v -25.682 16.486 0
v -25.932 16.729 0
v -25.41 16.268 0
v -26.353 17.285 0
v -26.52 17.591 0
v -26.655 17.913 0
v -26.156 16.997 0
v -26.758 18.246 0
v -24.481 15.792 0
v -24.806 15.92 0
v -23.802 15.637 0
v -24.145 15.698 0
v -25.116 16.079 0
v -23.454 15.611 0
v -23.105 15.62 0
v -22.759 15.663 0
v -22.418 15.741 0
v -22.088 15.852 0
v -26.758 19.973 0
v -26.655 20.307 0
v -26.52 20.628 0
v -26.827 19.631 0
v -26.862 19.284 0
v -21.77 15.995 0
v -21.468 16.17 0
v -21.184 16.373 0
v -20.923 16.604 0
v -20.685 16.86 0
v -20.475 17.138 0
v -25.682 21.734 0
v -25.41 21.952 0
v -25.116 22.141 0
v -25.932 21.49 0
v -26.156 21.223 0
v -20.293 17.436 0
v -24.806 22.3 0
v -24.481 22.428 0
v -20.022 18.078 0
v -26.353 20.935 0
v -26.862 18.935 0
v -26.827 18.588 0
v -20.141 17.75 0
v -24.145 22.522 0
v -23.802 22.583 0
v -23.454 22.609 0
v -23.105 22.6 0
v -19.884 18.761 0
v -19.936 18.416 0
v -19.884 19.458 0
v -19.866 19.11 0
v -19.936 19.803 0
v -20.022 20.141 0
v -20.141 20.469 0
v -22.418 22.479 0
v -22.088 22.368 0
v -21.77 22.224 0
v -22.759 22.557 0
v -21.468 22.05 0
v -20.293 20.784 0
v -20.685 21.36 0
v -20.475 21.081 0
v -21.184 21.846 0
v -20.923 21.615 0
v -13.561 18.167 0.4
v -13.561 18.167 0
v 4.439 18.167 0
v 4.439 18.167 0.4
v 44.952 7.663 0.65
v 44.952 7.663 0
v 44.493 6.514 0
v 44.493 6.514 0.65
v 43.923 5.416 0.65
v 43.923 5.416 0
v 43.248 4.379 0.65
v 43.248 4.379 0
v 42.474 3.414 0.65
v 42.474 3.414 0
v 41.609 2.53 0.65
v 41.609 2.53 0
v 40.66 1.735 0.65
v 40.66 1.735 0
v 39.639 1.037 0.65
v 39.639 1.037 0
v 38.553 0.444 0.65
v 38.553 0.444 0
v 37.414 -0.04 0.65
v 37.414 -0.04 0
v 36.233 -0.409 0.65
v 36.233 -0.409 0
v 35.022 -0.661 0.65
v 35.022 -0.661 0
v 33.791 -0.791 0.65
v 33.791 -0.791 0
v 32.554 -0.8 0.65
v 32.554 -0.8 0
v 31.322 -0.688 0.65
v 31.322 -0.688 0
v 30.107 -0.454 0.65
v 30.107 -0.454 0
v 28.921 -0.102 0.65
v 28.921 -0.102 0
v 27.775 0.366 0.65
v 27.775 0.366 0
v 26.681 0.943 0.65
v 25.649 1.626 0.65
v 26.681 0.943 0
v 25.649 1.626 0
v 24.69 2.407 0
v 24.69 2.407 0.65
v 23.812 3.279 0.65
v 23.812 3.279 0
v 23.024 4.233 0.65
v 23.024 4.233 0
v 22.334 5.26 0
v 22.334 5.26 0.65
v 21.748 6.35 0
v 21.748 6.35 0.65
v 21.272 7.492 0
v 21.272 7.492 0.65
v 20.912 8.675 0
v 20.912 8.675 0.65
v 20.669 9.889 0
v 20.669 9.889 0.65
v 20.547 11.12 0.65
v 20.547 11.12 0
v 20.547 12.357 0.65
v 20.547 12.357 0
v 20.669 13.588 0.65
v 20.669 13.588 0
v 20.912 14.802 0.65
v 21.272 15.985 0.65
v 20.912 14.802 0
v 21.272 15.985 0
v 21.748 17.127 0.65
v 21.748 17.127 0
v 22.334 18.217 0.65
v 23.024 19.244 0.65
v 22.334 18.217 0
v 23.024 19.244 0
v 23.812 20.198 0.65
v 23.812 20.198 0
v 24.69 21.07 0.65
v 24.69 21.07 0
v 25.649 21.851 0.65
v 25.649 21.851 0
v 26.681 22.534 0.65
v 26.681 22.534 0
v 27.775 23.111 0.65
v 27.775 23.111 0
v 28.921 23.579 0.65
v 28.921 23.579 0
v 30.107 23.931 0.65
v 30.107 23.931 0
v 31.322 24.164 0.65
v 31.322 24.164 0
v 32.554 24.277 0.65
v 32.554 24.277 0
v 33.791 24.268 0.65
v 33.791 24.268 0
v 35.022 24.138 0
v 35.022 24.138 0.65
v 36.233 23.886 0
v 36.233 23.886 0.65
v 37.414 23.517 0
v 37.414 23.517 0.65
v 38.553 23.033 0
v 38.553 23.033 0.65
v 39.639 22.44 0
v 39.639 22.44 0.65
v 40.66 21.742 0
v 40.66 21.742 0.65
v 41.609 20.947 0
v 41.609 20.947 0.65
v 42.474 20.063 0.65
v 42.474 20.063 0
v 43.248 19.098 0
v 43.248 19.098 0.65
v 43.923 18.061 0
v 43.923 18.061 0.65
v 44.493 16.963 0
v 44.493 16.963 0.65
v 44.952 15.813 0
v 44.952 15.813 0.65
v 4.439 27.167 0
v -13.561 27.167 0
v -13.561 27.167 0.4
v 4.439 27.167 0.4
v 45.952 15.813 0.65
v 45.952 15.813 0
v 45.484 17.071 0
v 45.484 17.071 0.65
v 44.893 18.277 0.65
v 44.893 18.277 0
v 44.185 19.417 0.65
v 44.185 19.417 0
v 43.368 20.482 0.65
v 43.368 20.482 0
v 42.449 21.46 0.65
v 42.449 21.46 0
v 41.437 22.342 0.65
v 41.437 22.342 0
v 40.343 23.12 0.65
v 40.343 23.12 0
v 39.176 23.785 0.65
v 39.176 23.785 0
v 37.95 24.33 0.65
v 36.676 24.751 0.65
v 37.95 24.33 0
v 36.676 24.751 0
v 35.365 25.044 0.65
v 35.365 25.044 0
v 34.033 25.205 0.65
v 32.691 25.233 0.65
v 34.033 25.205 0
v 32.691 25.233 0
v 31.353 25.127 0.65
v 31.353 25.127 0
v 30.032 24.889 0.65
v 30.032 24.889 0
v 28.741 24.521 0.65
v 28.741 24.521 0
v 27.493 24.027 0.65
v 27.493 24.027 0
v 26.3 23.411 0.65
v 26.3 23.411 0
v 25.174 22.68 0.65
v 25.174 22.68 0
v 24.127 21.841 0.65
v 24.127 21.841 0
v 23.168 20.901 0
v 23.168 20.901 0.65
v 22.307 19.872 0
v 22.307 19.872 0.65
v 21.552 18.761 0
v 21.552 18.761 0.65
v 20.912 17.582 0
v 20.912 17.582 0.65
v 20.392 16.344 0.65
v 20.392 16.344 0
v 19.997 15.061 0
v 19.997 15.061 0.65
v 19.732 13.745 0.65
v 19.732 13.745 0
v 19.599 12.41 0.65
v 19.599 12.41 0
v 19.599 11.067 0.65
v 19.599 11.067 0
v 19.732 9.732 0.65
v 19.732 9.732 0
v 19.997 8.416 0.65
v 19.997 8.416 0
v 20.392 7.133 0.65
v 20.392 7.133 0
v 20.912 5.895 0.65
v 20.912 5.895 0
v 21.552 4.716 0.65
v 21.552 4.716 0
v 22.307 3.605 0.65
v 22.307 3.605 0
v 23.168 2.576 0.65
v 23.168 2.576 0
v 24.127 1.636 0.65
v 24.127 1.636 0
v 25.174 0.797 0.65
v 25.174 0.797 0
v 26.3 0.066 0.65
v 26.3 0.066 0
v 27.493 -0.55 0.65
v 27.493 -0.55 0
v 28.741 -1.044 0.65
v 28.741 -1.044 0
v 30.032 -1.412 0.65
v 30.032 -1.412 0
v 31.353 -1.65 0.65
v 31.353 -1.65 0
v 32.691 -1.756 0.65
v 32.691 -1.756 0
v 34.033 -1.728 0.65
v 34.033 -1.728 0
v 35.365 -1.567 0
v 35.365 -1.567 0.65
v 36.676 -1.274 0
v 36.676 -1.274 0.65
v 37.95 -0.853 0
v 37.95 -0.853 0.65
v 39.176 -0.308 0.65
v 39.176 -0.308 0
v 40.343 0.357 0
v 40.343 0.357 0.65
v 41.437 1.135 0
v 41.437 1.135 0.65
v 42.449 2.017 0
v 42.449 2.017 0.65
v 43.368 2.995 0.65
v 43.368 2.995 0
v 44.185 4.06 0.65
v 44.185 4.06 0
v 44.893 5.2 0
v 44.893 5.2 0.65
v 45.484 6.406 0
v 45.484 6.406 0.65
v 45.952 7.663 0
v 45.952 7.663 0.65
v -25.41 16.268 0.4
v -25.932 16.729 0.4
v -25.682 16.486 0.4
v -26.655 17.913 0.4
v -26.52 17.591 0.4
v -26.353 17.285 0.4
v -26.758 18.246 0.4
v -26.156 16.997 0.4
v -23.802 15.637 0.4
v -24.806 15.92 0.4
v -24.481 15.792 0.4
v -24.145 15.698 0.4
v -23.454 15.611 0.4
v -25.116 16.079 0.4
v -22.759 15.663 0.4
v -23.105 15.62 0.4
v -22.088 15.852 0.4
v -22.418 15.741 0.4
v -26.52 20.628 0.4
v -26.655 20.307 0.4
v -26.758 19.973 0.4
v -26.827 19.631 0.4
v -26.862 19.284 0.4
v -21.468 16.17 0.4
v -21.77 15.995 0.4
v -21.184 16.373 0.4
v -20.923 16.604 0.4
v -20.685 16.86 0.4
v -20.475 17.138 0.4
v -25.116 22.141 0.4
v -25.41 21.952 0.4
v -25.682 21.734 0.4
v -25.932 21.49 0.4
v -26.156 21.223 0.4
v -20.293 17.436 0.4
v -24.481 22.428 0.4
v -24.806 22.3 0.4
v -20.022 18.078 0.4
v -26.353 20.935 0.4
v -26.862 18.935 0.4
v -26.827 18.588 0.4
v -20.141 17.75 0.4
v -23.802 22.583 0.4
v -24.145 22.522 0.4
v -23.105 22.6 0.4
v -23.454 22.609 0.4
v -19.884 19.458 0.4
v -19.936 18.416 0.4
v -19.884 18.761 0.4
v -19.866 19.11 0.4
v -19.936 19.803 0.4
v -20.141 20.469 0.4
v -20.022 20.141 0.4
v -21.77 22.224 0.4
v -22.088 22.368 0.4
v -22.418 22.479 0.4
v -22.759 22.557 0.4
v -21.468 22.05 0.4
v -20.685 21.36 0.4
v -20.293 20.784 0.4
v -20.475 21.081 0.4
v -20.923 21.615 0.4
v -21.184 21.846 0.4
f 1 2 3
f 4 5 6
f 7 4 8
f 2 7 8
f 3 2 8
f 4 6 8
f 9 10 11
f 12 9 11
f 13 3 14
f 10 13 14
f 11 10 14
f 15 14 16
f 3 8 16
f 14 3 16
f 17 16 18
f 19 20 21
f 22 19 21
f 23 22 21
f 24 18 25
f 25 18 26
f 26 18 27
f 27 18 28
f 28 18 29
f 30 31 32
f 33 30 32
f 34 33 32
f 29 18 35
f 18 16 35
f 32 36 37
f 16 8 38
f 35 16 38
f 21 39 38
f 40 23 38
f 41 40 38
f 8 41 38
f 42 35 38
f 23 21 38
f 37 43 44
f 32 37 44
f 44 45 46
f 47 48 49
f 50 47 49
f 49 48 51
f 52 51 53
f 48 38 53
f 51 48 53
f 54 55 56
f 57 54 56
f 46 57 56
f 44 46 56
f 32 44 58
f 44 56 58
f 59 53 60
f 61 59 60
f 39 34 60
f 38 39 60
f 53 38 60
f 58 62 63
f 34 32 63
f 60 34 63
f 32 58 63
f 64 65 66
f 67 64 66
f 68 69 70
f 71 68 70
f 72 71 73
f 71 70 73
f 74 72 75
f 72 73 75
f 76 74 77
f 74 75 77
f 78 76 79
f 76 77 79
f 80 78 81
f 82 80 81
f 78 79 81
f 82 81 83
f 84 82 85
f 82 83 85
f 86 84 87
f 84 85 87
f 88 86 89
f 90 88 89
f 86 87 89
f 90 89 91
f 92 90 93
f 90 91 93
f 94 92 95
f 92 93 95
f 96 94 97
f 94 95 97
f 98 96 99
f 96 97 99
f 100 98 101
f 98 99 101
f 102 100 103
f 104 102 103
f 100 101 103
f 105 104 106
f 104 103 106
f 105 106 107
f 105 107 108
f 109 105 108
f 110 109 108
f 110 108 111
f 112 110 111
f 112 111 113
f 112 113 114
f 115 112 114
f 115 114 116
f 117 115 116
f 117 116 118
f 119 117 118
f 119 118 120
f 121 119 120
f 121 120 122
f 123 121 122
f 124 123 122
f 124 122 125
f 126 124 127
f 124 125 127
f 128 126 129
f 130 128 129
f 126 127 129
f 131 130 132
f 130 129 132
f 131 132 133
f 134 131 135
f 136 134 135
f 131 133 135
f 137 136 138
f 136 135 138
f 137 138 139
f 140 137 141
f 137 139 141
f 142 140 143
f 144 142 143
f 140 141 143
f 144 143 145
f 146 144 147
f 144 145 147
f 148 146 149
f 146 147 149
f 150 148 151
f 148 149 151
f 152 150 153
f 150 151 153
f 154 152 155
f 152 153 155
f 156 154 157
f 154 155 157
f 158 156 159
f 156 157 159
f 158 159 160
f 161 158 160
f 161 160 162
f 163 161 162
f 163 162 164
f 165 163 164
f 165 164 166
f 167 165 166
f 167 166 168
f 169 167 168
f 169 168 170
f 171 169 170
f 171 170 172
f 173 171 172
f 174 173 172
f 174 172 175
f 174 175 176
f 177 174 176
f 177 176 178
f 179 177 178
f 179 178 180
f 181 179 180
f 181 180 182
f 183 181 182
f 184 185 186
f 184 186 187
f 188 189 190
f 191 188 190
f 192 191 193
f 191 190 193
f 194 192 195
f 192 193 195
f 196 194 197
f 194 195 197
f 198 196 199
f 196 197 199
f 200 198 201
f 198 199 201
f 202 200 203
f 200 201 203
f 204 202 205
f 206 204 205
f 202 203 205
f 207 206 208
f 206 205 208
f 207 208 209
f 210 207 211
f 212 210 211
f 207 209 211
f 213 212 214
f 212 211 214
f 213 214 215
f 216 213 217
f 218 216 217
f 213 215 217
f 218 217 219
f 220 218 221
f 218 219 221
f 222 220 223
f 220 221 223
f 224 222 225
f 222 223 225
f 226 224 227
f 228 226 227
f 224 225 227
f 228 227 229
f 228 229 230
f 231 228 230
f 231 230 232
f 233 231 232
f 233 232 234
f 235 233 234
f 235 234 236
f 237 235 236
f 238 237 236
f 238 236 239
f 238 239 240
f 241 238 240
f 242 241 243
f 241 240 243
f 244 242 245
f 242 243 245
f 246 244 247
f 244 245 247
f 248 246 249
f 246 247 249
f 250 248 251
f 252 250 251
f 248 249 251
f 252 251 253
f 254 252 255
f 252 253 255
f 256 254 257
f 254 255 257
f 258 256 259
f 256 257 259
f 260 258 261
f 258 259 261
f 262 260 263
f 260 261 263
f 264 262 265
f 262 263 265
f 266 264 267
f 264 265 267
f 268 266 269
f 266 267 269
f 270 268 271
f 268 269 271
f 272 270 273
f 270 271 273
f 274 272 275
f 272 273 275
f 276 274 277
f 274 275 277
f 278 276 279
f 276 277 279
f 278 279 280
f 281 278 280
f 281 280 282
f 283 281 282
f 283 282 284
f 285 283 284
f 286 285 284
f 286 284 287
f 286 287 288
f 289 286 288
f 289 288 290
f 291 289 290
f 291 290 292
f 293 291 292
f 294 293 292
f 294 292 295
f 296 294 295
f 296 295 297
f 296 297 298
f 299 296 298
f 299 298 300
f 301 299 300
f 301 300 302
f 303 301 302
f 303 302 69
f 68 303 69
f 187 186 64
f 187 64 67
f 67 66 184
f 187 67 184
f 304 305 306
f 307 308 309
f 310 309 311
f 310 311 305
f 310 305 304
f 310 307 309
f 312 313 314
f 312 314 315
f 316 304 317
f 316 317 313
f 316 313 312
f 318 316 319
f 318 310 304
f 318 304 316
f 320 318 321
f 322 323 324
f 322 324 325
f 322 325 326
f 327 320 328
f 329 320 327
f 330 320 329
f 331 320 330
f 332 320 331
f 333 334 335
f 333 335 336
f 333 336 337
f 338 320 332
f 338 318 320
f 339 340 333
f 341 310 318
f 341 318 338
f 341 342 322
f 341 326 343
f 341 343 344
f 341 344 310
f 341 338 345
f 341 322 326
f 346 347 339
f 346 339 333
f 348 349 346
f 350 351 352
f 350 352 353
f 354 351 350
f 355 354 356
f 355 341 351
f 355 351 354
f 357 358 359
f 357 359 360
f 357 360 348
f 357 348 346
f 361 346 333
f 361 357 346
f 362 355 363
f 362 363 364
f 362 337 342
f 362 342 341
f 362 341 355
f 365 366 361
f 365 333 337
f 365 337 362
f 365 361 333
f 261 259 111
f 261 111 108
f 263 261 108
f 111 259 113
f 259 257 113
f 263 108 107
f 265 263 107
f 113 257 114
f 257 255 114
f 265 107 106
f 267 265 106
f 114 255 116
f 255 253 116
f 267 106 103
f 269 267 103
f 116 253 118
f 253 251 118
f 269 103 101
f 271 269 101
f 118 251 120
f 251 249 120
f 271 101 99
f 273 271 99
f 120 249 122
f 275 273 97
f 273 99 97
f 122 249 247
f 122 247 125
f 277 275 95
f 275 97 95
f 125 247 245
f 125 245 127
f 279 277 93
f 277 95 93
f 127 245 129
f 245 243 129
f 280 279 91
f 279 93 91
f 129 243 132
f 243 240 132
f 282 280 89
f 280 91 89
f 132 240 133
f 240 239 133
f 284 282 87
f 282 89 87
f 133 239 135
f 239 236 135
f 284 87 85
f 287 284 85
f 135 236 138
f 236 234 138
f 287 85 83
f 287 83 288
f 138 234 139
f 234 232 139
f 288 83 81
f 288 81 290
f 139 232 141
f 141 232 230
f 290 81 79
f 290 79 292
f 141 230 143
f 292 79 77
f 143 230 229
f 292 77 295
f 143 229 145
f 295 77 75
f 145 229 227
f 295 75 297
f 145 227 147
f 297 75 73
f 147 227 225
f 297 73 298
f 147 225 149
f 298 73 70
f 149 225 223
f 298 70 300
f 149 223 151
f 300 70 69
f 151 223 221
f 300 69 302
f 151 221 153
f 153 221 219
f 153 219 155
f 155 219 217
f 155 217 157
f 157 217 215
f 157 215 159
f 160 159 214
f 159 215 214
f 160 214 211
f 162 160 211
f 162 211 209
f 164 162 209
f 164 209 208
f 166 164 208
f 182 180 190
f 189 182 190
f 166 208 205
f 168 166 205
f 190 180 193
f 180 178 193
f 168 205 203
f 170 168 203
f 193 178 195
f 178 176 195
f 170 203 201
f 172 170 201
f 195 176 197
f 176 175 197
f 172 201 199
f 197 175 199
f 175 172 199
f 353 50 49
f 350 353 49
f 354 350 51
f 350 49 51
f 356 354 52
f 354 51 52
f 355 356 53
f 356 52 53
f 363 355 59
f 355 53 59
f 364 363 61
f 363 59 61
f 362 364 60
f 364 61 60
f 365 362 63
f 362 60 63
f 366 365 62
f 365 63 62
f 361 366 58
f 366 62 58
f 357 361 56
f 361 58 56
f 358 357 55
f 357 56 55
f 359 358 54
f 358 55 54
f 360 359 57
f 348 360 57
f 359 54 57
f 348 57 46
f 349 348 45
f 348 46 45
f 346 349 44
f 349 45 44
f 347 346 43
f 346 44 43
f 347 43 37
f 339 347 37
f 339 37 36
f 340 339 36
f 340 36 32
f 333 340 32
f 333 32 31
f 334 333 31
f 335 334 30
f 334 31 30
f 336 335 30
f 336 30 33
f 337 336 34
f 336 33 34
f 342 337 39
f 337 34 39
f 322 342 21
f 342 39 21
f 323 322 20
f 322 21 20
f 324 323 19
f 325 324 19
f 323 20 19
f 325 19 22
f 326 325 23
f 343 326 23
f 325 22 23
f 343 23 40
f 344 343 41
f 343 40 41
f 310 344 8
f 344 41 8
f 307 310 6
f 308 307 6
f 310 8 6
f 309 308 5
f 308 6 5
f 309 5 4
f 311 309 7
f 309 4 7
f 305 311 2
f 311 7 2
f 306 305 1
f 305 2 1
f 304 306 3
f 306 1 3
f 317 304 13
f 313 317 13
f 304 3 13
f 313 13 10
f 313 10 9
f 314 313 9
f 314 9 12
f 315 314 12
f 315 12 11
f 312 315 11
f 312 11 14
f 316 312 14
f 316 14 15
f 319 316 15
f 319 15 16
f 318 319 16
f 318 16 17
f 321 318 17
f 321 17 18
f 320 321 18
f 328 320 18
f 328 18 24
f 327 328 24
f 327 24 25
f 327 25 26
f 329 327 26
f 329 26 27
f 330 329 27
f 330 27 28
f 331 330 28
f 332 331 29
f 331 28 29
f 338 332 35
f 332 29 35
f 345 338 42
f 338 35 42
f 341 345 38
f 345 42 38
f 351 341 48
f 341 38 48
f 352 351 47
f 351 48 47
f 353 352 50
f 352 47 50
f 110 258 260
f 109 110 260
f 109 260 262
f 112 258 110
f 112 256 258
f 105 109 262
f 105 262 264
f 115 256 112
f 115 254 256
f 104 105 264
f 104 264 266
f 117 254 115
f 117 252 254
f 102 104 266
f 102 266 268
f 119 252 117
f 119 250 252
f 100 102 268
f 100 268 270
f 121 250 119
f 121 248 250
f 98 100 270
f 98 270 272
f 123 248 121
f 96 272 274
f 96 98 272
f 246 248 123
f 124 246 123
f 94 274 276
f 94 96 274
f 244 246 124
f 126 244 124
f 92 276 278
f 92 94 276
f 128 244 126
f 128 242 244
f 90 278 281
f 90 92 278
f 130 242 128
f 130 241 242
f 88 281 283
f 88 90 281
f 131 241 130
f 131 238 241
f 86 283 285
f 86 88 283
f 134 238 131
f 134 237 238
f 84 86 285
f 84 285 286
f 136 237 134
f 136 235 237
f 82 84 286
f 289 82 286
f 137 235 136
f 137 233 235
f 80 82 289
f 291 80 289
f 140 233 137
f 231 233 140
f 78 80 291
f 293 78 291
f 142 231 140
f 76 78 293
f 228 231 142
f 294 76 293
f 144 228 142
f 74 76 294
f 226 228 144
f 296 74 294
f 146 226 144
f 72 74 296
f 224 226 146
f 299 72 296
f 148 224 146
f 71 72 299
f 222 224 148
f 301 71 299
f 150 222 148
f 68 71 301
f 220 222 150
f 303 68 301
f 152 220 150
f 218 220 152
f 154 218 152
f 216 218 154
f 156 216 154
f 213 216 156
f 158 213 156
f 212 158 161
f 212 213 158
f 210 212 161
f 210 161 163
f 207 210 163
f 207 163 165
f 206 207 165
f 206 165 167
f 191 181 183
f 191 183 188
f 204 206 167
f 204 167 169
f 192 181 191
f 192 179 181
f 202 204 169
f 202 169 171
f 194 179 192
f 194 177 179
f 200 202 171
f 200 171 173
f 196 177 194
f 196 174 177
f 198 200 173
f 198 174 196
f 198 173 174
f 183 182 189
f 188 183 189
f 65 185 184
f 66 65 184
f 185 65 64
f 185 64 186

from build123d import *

# Parameters (mm, degrees)
F0_R     = 3.5
F1_DEPTH = 0.4
F0_W     = 18
F0_H     = 9
F2_DEPTH = 0.4
F3_DEPTH = 0.65


with BuildPart() as f1:
    # F0 (on Top) → F1 (new body)
    with BuildSketch(Plane.XY):
        with Locations((-23.366418443, 19.1098190844)):
            Circle(F0_R)
    extrude(amount=F1_DEPTH)


with BuildPart() as f2:
    # F0 (on Top) → F2 (new body)
    with BuildSketch(Plane.XY):
        with Locations((-4.560760178, 22.666967287)):
            Rectangle(F0_W, F0_H)
    extrude(amount=F2_DEPTH)


with BuildPart() as f3:
    # F0 (on Top) → F3 (new body)
    with BuildSketch(Plane.XY):
        with BuildLine():
            ThreePointArc((44.9519422085, 7.6634903133), (20.5319432616, 11.7384903133), (44.9519422085, 15.8134903133))
            Line((44.9519422085, 15.8134903133), (45.9522336624, 15.8134903133))
            ThreePointArc((45.9522336624, 15.8134903133), (19.5819432616, 11.7384903133), (45.9522336624, 7.6634903133))
            Line((45.9522336624, 7.6634903133), (44.9519422085, 7.6634903133))
        make_face()
    extrude(amount=F3_DEPTH)


solid = Compound([f1.part, f2.part, f3.part])
